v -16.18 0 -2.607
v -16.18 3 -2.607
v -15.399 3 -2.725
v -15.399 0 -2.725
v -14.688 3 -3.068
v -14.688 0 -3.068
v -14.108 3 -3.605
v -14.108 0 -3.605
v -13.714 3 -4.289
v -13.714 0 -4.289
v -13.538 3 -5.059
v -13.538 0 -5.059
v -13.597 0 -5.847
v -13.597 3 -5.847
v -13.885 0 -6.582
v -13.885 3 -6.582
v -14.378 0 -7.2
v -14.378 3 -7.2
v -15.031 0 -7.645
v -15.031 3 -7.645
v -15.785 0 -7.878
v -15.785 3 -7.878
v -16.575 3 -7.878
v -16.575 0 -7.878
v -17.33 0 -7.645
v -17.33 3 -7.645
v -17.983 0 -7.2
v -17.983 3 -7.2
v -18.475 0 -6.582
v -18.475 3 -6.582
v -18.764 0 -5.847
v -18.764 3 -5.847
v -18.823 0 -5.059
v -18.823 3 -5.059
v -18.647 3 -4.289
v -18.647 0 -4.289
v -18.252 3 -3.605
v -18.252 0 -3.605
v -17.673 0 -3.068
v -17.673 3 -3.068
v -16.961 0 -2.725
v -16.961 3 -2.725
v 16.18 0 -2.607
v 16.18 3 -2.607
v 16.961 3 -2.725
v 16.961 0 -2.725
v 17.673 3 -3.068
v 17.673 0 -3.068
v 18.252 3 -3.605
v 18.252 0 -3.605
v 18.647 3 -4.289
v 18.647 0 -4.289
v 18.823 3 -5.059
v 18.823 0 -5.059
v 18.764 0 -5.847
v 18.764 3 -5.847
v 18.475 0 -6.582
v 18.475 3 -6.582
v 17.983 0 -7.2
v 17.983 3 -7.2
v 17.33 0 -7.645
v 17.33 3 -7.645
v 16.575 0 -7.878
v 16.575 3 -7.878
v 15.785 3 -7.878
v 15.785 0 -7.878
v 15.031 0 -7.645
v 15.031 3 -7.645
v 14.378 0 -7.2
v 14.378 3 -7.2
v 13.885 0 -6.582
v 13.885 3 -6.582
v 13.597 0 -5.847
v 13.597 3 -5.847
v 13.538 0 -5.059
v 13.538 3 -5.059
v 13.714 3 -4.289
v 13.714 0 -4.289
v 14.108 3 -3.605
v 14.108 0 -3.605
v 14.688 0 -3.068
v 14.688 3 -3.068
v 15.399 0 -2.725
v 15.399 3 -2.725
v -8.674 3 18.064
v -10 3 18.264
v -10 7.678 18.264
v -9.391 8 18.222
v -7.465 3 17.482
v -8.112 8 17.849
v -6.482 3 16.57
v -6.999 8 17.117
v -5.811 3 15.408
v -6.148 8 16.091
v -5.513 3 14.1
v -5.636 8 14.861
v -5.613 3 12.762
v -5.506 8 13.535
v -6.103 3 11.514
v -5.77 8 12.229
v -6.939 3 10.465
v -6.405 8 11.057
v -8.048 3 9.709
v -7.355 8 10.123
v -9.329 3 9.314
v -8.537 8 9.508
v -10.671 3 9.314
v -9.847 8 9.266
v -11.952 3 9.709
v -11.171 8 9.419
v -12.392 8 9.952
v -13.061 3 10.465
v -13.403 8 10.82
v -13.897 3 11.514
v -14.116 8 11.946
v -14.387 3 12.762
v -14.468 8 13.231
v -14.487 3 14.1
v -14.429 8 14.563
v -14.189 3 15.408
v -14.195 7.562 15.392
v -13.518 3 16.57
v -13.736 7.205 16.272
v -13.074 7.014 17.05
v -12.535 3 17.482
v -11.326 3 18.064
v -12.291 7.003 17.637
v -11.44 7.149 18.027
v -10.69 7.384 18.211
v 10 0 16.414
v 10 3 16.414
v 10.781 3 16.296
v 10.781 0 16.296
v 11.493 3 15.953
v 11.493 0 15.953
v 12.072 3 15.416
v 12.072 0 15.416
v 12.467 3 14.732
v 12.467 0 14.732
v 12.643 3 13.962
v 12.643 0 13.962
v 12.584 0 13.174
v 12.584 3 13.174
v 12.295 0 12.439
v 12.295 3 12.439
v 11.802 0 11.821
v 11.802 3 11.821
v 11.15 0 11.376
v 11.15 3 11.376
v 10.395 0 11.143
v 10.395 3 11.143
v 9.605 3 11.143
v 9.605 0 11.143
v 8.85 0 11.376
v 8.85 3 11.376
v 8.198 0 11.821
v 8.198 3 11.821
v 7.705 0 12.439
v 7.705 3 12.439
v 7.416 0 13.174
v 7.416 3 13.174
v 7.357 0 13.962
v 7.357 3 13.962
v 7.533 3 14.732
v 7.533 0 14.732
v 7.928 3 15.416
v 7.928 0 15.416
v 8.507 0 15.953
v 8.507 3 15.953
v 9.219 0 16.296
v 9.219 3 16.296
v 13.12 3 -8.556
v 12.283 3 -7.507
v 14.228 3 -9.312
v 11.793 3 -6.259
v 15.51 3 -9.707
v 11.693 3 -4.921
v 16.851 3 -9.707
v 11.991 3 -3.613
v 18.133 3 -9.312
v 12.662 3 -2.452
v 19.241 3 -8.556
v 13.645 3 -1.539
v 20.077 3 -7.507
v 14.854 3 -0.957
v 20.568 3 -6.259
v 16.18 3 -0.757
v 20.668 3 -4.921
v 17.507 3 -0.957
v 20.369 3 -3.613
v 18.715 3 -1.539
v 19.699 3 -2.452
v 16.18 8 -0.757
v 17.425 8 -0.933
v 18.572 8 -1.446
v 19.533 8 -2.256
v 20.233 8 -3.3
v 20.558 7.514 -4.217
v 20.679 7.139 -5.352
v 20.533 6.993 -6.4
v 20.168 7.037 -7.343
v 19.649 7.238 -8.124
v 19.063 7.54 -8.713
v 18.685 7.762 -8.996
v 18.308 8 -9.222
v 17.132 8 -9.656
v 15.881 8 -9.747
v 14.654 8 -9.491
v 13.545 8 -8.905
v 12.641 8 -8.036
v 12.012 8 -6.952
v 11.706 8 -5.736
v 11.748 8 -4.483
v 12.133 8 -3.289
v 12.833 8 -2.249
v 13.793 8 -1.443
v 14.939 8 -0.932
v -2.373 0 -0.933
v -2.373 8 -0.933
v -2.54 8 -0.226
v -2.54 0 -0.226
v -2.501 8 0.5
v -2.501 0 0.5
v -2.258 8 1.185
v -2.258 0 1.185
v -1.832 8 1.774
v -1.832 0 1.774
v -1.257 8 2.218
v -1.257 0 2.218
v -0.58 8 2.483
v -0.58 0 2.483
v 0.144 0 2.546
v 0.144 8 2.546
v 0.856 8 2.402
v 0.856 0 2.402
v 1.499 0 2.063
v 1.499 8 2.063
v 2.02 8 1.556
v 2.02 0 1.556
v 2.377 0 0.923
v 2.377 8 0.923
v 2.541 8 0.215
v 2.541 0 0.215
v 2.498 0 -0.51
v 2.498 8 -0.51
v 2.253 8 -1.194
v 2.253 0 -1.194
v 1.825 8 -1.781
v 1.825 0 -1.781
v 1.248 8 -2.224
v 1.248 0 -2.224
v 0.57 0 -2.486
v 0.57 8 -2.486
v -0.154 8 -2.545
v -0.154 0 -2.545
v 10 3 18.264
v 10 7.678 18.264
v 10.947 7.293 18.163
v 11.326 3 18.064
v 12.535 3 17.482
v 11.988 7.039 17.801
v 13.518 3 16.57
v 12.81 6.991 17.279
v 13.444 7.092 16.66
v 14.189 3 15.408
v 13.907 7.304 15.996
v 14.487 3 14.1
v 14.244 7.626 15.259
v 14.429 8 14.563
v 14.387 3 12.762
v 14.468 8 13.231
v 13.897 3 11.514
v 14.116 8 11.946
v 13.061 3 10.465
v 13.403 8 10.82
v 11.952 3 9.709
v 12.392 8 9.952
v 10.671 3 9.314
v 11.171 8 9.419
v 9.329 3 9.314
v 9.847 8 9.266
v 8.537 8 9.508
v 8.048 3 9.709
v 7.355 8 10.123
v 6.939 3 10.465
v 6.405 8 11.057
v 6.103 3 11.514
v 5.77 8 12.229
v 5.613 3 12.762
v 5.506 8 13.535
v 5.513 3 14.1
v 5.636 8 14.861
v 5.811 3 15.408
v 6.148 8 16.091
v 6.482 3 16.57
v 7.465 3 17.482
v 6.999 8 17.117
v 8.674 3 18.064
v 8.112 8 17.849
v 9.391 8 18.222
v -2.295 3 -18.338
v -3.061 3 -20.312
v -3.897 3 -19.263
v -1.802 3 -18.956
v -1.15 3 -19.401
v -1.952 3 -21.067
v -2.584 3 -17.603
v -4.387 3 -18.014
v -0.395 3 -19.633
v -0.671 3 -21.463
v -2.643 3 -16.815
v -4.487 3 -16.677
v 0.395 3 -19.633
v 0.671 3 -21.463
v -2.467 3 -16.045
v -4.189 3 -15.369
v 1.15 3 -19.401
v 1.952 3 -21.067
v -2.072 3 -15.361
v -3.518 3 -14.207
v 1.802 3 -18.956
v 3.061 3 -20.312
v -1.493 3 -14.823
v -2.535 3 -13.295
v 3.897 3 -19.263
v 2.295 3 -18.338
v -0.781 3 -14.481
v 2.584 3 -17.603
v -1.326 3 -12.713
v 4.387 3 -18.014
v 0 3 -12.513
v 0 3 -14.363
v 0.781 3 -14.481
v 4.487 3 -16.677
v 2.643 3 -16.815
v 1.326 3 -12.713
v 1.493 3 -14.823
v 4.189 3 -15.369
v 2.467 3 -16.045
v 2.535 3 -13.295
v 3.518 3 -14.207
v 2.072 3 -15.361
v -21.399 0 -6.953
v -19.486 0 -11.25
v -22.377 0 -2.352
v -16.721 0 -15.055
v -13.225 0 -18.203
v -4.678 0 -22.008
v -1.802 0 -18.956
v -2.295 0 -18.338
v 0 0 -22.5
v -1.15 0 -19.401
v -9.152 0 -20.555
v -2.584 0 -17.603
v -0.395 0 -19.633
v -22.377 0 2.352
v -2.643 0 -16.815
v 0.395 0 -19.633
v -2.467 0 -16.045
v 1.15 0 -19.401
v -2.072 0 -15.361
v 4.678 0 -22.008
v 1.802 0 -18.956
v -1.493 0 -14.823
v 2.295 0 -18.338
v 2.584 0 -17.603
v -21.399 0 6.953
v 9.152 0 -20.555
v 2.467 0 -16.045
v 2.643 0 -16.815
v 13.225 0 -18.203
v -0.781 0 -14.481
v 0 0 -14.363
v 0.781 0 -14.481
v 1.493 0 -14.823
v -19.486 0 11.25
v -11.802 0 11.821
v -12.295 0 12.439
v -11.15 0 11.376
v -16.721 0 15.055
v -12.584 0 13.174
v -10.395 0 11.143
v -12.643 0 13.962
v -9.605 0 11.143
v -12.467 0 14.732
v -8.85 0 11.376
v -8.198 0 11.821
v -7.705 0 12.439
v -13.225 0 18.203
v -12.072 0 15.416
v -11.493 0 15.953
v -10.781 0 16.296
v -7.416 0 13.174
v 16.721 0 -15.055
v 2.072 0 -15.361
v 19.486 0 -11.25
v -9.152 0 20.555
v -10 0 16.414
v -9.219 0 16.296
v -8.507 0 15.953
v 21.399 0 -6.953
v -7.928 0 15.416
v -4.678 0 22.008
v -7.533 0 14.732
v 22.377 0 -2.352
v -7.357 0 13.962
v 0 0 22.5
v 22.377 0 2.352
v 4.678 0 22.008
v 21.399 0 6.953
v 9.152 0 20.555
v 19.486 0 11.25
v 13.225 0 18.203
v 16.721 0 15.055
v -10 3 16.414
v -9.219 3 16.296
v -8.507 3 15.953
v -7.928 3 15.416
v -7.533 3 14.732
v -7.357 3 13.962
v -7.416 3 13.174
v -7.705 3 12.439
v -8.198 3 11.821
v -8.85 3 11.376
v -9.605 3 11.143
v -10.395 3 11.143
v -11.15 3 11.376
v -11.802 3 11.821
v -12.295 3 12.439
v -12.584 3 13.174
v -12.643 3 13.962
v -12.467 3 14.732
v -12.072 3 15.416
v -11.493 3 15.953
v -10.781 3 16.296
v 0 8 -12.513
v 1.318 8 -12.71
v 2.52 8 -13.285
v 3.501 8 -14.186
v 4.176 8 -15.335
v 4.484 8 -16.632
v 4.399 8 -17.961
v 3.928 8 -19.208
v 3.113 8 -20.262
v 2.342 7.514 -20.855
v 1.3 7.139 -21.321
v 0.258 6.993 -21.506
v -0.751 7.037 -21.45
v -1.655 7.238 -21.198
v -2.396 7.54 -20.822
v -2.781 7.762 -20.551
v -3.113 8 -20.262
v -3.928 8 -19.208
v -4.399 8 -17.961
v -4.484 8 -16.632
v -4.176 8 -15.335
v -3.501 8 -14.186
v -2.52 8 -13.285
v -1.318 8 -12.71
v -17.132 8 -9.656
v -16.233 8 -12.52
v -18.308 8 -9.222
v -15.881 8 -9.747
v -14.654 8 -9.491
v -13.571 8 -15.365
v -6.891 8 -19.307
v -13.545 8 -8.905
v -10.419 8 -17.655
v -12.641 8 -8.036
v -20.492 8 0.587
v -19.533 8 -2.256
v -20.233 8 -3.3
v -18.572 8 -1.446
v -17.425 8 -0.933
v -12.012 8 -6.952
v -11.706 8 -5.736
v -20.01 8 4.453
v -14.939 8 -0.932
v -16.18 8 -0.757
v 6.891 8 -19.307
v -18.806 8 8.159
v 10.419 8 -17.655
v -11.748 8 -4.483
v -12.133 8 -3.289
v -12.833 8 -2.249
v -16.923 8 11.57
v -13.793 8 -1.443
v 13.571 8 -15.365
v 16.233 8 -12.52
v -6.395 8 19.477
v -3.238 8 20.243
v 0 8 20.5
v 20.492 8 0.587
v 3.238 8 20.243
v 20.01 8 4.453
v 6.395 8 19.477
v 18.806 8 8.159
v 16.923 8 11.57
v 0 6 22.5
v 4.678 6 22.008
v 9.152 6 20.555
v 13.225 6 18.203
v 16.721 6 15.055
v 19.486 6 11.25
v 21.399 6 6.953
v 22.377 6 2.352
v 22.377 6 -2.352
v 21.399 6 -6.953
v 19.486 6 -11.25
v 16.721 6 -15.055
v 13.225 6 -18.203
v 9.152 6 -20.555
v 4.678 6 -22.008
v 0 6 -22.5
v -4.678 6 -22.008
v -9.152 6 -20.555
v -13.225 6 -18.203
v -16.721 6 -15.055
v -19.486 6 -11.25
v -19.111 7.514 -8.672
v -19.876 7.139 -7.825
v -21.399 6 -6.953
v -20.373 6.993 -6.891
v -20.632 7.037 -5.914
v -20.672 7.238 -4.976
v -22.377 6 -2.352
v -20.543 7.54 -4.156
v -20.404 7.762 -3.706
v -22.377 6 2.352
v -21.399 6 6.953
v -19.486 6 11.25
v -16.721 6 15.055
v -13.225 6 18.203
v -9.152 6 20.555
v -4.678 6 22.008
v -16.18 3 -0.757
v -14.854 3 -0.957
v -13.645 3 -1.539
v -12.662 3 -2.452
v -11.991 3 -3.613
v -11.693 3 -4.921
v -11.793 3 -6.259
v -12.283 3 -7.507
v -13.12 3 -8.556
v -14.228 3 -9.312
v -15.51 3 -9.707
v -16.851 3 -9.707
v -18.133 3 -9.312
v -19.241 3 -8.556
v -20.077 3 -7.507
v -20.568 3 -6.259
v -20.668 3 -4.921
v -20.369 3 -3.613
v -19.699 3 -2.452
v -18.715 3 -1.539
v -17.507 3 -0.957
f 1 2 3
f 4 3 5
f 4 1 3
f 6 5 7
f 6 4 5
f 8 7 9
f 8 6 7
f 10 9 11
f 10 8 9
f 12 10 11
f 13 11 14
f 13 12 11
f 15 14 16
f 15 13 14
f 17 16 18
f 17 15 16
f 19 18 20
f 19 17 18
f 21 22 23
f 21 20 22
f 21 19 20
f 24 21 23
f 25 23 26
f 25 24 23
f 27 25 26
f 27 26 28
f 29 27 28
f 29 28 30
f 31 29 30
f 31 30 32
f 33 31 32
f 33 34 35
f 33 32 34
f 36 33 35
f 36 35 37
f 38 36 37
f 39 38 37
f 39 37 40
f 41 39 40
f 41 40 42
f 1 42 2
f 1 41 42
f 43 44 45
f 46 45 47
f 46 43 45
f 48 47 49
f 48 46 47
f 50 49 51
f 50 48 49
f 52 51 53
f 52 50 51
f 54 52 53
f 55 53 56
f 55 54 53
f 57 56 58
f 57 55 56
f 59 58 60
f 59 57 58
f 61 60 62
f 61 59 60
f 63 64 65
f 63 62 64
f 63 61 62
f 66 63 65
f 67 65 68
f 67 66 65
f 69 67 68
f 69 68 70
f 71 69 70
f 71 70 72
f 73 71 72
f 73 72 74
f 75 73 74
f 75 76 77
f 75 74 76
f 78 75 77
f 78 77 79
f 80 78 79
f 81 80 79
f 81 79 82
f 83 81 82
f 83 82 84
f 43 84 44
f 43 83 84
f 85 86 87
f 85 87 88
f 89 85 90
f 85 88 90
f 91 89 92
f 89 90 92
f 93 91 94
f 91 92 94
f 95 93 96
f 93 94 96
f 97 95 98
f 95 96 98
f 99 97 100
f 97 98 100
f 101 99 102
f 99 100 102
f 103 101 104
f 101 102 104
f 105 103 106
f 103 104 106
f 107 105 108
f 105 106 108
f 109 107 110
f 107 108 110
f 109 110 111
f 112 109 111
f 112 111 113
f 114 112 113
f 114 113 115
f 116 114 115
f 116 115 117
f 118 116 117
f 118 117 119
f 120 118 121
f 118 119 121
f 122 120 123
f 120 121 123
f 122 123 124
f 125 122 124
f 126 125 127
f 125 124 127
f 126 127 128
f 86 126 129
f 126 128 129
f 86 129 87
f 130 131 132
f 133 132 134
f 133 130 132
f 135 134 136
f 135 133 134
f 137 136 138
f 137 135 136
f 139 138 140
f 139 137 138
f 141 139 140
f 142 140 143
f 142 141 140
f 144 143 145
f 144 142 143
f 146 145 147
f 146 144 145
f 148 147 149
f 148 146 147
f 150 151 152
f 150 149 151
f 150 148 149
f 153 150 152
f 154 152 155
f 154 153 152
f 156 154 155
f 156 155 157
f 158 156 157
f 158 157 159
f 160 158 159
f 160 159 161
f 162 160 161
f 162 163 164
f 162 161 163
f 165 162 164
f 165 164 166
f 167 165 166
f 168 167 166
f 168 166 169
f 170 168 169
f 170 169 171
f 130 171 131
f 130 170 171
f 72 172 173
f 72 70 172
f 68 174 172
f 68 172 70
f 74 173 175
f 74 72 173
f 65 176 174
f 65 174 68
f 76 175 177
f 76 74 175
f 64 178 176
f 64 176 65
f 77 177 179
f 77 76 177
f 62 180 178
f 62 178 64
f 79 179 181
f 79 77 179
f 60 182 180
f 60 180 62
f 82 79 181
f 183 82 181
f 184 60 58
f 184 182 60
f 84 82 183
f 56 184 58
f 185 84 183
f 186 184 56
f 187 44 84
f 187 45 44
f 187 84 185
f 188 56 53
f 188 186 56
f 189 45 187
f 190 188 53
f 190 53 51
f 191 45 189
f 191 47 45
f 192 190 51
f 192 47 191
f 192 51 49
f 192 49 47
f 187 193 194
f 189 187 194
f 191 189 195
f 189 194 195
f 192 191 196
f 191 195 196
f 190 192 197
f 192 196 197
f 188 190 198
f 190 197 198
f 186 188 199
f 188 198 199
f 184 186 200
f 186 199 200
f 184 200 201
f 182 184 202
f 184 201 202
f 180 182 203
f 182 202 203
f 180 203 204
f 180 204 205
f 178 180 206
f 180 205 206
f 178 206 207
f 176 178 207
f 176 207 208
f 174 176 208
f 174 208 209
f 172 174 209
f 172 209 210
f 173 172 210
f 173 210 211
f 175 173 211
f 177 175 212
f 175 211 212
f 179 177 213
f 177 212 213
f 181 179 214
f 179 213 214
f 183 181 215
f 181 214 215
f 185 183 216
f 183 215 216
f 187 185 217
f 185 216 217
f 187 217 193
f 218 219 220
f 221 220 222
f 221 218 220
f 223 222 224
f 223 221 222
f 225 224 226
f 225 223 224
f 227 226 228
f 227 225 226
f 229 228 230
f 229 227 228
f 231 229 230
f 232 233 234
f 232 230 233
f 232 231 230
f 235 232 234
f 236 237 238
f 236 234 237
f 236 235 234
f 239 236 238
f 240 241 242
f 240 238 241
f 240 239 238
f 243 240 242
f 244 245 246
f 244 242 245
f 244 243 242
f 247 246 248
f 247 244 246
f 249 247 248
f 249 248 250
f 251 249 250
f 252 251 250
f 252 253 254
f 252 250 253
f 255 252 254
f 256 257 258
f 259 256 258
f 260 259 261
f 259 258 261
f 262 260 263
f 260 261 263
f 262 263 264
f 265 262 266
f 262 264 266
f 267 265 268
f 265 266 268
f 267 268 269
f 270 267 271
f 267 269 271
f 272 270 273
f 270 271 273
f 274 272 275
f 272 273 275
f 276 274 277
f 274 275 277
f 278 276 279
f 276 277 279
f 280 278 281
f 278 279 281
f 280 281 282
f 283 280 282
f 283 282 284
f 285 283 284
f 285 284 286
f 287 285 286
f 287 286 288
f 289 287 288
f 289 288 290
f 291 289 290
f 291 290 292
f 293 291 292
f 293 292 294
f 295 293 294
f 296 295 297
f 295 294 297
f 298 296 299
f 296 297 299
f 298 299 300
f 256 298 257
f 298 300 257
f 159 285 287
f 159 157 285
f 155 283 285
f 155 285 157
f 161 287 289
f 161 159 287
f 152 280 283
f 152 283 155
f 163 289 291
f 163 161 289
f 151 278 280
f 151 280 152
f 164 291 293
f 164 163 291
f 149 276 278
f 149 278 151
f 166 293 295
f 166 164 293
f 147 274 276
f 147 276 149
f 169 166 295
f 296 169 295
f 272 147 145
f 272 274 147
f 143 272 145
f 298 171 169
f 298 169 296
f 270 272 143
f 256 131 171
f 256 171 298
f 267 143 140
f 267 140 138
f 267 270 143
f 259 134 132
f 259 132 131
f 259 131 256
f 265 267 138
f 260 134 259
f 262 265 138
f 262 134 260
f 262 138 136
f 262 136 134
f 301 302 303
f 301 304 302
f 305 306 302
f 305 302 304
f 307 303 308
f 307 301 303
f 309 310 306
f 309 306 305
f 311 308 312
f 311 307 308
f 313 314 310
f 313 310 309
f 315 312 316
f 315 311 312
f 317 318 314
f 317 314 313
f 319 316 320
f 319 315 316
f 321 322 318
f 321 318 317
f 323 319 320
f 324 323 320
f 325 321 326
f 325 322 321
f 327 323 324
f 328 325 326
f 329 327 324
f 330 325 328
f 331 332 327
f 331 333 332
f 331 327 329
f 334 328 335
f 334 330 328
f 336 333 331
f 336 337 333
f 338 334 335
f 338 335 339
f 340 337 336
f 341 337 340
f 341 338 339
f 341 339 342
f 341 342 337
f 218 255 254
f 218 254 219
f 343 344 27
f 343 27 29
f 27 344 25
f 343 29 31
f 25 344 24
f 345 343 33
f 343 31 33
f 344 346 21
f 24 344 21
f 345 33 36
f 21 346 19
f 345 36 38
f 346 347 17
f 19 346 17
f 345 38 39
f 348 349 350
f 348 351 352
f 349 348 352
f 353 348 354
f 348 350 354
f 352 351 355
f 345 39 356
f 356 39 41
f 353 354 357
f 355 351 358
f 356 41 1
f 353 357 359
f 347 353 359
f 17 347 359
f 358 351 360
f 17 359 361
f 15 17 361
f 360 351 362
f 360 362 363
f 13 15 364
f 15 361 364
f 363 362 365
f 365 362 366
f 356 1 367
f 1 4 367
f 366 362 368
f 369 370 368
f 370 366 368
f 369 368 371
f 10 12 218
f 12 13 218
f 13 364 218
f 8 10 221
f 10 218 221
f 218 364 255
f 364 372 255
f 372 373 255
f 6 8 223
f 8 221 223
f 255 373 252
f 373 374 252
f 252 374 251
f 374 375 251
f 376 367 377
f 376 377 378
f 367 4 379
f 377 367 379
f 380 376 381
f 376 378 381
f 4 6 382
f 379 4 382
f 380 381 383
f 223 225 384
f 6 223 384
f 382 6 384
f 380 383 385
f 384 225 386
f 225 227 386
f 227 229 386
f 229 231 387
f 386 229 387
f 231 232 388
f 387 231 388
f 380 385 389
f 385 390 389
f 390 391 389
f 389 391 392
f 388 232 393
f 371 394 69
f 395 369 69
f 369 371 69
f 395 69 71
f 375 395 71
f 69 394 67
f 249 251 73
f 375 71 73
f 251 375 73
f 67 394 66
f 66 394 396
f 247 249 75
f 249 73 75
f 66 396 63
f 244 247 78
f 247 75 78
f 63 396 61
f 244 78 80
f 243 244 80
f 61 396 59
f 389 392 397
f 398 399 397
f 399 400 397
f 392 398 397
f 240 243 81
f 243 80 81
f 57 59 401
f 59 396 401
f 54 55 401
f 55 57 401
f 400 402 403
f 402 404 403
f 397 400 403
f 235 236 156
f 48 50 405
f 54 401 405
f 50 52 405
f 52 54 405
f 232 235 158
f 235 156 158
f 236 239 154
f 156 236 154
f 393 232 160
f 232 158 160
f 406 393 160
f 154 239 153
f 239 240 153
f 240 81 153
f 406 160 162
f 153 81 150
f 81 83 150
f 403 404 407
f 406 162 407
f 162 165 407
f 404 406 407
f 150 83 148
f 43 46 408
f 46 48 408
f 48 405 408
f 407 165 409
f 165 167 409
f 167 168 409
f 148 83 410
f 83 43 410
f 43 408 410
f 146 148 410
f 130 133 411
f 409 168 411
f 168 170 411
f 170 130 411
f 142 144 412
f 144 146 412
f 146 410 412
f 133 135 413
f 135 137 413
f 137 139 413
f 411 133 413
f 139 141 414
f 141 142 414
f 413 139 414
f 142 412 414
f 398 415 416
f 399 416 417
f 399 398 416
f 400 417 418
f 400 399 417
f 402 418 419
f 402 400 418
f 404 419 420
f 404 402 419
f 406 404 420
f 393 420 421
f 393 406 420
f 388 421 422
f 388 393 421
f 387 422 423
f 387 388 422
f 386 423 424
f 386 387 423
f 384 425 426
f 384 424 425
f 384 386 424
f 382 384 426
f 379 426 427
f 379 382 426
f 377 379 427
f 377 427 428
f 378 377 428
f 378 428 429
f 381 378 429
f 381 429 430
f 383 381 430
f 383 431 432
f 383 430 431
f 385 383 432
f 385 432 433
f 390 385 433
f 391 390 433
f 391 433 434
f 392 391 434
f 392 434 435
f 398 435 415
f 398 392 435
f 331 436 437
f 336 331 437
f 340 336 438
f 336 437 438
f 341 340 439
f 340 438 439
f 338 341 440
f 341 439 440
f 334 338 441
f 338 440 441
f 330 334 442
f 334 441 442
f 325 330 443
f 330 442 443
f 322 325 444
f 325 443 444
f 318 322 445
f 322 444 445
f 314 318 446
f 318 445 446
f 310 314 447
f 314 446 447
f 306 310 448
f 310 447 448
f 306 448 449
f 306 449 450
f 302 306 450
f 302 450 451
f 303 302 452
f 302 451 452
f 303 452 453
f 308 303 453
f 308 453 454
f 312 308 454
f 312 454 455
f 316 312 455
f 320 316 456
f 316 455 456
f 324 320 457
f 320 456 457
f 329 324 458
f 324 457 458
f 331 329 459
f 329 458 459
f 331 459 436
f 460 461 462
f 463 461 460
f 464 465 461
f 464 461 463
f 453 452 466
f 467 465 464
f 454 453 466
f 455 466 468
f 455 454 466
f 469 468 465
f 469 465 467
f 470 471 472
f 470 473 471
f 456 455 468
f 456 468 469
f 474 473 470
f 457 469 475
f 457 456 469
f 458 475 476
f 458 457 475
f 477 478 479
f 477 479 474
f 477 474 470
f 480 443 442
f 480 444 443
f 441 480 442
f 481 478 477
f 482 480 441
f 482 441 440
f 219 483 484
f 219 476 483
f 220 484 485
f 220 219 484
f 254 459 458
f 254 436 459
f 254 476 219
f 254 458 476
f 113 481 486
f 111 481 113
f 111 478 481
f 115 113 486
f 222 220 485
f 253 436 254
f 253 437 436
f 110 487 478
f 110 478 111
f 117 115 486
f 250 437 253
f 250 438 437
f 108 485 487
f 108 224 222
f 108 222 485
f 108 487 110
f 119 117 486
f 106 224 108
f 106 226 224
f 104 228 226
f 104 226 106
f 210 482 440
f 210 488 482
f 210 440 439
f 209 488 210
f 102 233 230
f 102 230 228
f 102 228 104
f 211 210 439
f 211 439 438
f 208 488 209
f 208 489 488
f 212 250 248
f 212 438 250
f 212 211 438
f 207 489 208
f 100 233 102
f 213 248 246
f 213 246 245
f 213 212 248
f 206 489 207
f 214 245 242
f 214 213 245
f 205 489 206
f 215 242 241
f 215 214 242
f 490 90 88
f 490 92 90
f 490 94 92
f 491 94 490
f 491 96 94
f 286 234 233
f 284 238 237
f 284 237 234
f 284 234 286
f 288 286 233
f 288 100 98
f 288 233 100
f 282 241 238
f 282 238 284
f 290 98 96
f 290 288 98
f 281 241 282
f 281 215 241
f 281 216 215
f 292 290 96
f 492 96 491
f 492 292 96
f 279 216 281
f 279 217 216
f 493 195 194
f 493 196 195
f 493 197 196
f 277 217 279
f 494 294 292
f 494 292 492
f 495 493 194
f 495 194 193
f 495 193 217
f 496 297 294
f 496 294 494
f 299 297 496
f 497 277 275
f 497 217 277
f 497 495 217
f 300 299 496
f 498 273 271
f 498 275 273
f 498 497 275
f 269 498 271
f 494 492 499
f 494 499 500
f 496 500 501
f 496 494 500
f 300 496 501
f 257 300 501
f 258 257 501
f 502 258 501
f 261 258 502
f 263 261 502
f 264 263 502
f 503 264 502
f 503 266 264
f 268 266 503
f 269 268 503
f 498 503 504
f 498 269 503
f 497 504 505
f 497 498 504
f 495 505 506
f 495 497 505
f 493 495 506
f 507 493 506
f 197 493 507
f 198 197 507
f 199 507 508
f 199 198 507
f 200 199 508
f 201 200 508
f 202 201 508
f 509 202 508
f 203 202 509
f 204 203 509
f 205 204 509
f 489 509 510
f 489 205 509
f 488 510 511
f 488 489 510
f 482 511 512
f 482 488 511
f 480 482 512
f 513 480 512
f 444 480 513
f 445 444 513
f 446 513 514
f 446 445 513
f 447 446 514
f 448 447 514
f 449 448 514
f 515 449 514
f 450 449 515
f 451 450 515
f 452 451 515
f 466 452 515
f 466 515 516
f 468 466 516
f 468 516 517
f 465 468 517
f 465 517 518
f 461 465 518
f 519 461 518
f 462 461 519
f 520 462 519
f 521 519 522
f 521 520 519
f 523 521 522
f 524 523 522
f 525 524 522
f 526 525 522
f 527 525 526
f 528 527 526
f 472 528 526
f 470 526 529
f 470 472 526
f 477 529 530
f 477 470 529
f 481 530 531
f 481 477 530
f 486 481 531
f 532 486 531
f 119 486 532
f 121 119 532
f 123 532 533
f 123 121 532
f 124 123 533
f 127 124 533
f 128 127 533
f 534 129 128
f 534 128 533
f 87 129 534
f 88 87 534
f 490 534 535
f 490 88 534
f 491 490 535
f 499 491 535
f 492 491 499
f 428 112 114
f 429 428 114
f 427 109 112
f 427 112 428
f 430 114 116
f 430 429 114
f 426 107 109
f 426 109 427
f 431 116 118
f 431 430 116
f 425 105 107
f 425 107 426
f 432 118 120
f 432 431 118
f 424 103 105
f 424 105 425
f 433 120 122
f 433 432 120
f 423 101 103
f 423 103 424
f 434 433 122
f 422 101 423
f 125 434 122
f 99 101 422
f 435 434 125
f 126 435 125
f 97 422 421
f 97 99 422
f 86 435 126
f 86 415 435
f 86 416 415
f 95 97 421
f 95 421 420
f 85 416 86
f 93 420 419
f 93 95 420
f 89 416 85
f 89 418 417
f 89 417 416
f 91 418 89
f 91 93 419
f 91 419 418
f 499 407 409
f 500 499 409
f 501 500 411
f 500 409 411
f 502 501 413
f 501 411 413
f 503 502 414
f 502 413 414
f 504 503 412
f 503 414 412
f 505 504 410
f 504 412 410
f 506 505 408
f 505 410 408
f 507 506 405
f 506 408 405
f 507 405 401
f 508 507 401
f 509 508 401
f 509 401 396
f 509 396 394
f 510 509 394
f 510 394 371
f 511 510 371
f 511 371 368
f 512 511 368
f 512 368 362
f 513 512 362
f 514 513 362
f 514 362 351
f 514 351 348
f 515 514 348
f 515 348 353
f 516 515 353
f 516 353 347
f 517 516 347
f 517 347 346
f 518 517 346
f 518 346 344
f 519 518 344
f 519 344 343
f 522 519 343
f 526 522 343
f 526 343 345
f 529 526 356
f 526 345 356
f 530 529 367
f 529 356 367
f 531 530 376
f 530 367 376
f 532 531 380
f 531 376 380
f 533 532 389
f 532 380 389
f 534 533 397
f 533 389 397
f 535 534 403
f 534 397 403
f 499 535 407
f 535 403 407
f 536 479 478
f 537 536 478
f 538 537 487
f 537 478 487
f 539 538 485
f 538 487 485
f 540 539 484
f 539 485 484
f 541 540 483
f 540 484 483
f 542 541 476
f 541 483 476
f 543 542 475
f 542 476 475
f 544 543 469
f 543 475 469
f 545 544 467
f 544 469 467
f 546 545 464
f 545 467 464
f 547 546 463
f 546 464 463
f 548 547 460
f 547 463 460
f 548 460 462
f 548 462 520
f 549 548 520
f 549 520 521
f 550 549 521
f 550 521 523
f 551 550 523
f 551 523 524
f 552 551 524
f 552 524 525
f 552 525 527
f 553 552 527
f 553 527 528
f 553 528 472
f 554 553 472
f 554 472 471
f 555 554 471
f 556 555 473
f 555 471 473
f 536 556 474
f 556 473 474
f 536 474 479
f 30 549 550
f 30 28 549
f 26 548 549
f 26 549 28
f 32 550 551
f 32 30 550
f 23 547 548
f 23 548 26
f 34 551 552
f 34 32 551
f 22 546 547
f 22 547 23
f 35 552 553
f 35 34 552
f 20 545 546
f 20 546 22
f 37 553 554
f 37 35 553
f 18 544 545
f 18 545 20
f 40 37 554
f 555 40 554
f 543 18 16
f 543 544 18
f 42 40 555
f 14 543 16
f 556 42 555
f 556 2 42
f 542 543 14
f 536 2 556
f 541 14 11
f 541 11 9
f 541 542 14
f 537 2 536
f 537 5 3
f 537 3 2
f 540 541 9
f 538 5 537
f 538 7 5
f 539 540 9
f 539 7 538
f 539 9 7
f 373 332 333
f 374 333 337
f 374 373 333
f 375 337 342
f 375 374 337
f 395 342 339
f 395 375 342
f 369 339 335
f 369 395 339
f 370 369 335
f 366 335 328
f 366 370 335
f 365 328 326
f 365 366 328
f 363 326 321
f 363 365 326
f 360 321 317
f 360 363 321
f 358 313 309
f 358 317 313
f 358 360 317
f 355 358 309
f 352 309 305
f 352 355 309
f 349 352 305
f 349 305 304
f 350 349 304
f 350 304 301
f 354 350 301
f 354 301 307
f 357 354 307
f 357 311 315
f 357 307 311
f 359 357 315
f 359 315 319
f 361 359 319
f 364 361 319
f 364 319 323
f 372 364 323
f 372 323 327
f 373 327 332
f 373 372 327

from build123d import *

# Parameters (mm, degrees)
SKETCH1_R           = 22.5
SKETCH1_R_2         = 2.65
BOSS_EXTRUDE1_DEPTH = 8
SKETCH2_R           = 4.5
CUT_EXTRUDE1_DEPTH  = 5
CHAMFER1_SIZE       = 2
CUT_EXTRUDE3_DEPTH  = 33.810059595


with BuildPart() as part:
    # Sketch1 → Boss-Extrude1 (new body)
    with BuildSketch(Plane(origin=(0, 0, 0), x_dir=(1, 0, 0), z_dir=(0, 1, 0))):
        with Locations(Location((0, 0, 0), (0, 0, 270))):
            Circle(SKETCH1_R)
        with Locations(Location((0, 17.013016167, 0), (0, 0, 270))):
            Circle(SKETCH1_R_2, mode=Mode.SUBTRACT)
        with Locations(Location((-16.180339887, 5.257311121, 0), (0, 0, 270))):
            Circle(SKETCH1_R_2, mode=Mode.SUBTRACT)
        with Locations(Location((-10, -13.763819205, 0), (0, 0, 270))):
            Circle(SKETCH1_R_2, mode=Mode.SUBTRACT)
        with Locations(Location((10, -13.763819205, 0), (0, 0, 270))):
            Circle(SKETCH1_R_2, mode=Mode.SUBTRACT)
        with Locations(Location((16.180339887, 5.257311121, 0), (0, 0, 270))):
            Circle(SKETCH1_R_2, mode=Mode.SUBTRACT)
    extrude(amount=BOSS_EXTRUDE1_DEPTH)

    # Sketch2 → Cut-Extrude1 (cut)
    with BuildSketch(Plane(origin=(0, 8, 0), x_dir=(1, 0, 0), z_dir=(0, 1, 0))):
        with Locations(Location((-16.180339887, 5.257311121, 0), (0, 0, 270))):
            Circle(SKETCH2_R)
        with Locations(Location((0, 17.013016167, 0), (0, 0, 270))):
            Circle(SKETCH2_R)
        with Locations(Location((16.180339887, 5.257311121, 0), (0, 0, 270))):
            Circle(SKETCH2_R)
        with Locations(Location((10, -13.763819205, 0), (0, 0, 270))):
            Circle(SKETCH2_R)
        with Locations(Location((-10, -13.763819205, 0), (0, 0, 270))):
            Circle(SKETCH2_R)
    extrude(amount=-CUT_EXTRUDE1_DEPTH, mode=Mode.SUBTRACT)

    # Chamfer1
    # the kernel refuses this chamfer: 2 mm, written as the material it takes off along each edge
    with BuildSketch(Plane(origin=(0, 8, 0), x_dir=(0, 0, 1), z_dir=(-1, 0, 0))) as chamfer1_piece_1:
        Polygon((22.5, -CHAMFER1_SIZE), (22.5 - CHAMFER1_SIZE, 0), (22.5, 0), align=None)
    revolve(axis=Axis((0, 8, 0), (0, 1, 0)), mode=Mode.SUBTRACT)

    # Sketch3 → Cut-Extrude3 (cut, through all)
    with BuildSketch(Plane.XZ):
        with BuildLine():
            Line((-0.154470077, -2.545317072), (-2.373006508, -0.933456004))
            ThreePointArc((-2.373006508, -0.933456004), (1.498852393, 2.062993336), (-0.154470077, -2.545317072))
        make_face()
    extrude(amount=-CUT_EXTRUDE3_DEPTH, mode=Mode.SUBTRACT)


solid = part.part
